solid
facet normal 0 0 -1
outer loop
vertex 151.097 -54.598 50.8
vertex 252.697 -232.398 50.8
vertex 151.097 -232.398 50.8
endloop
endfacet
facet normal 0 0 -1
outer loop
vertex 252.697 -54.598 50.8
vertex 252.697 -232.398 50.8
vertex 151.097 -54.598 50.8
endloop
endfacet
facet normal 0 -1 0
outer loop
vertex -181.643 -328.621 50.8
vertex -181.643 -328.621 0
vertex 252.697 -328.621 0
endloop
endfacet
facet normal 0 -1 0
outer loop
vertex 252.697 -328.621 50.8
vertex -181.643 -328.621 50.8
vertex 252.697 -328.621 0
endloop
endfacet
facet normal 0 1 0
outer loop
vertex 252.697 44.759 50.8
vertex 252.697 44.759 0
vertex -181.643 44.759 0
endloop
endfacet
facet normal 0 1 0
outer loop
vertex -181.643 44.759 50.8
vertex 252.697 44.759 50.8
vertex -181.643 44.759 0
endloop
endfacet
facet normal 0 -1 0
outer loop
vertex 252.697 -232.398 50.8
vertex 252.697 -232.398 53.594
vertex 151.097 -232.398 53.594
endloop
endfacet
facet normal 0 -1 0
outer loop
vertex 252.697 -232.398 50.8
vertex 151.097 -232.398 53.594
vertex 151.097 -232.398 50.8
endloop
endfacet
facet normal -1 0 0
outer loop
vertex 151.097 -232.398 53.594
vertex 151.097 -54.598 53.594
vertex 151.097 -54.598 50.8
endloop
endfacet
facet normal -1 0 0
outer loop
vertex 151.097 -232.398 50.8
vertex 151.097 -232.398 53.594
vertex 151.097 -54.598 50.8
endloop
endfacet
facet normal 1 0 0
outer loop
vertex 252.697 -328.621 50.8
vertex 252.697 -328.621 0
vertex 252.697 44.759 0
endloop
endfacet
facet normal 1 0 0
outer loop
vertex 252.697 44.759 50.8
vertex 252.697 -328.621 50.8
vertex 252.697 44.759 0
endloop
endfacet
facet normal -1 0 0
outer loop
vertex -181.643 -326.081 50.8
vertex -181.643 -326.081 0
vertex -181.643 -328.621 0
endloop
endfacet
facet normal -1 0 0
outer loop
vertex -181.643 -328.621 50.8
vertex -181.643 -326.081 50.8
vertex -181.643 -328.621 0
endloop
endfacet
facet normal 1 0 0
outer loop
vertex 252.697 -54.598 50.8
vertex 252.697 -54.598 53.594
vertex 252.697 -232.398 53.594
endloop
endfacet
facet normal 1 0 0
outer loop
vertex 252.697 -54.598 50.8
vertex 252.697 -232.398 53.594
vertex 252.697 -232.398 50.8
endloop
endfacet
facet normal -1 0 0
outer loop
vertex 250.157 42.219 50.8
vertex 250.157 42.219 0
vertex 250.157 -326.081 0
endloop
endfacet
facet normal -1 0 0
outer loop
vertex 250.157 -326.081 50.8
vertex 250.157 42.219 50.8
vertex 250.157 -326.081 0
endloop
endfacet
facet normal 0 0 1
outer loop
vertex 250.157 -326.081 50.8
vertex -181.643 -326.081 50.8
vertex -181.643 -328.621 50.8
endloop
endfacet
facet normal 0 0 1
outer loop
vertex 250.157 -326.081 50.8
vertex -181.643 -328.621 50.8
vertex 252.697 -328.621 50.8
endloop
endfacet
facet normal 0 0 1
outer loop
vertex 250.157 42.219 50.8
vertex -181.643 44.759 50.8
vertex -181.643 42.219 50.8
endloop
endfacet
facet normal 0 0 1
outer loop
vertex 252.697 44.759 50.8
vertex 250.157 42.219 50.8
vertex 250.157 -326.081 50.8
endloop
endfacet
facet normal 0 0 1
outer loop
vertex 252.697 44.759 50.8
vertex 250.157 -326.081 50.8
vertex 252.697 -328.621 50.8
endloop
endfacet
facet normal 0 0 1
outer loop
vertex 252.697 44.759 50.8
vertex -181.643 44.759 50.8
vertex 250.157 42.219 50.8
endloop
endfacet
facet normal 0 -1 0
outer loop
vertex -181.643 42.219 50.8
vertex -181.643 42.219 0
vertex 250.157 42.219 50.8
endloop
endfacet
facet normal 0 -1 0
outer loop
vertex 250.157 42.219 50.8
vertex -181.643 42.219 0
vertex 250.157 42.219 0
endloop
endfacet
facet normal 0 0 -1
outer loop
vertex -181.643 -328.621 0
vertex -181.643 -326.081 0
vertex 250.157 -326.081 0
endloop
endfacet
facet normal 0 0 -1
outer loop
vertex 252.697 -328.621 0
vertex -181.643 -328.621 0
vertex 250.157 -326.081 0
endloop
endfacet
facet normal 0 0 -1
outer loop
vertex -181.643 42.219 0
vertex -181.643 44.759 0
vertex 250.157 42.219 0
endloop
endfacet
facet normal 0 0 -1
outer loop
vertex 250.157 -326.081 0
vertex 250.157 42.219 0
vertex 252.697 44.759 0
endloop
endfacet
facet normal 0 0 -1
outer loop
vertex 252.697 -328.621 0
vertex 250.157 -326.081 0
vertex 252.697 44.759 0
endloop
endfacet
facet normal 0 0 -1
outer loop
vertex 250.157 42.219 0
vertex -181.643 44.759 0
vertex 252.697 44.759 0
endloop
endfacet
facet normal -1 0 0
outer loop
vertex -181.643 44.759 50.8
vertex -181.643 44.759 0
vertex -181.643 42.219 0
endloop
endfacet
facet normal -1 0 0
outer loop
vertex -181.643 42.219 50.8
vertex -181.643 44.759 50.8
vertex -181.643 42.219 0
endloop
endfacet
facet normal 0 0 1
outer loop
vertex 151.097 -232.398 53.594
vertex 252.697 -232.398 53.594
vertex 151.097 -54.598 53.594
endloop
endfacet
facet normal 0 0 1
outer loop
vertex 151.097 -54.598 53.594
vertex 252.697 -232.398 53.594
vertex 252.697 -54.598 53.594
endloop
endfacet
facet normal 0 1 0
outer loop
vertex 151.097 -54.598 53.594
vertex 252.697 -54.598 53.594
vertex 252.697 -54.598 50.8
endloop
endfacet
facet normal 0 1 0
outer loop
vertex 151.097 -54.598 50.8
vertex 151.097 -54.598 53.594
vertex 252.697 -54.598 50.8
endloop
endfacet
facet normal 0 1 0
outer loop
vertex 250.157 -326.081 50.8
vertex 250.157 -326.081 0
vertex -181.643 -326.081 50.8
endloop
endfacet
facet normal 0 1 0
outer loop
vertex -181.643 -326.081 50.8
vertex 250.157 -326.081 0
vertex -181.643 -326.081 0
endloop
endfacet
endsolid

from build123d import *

# Parameters (mm, degrees)
BOSS_EXTRUDE1_DEPTH = 50.8
SKETCH6_W           = 2.794
SKETCH6_H           = 177.8
BOSS_EXTRUDE2_DEPTH = 101.6


with BuildPart() as part:
    # Sketch5 → Boss-Extrude1 (new body)
    with BuildSketch(Plane.XY):
        Polygon((-181.643091349, 42.219202195), (250.156908651, 42.219202195), (250.156908651, -326.080797805), (-181.643091349, -326.080797805), (-181.643091349, -328.620797805), (252.696908651, -328.620797805), (252.696908651, 44.759202195), (-181.643091349, 44.759202195), align=None)
    extrude(amount=BOSS_EXTRUDE1_DEPTH)


with BuildPart() as body_2:
    # Sketch6 → Boss-Extrude2 (new body)
    with BuildSketch(Plane(origin=(252.696908651, 0, 0), x_dir=(0, 0, -1), z_dir=(1, 0, 0))):
        with Locations((-52.197, -143.498449388)):
            Rectangle(SKETCH6_W, SKETCH6_H)
    extrude(amount=-BOSS_EXTRUDE2_DEPTH)


solid = Compound([part.part, body_2.part])
